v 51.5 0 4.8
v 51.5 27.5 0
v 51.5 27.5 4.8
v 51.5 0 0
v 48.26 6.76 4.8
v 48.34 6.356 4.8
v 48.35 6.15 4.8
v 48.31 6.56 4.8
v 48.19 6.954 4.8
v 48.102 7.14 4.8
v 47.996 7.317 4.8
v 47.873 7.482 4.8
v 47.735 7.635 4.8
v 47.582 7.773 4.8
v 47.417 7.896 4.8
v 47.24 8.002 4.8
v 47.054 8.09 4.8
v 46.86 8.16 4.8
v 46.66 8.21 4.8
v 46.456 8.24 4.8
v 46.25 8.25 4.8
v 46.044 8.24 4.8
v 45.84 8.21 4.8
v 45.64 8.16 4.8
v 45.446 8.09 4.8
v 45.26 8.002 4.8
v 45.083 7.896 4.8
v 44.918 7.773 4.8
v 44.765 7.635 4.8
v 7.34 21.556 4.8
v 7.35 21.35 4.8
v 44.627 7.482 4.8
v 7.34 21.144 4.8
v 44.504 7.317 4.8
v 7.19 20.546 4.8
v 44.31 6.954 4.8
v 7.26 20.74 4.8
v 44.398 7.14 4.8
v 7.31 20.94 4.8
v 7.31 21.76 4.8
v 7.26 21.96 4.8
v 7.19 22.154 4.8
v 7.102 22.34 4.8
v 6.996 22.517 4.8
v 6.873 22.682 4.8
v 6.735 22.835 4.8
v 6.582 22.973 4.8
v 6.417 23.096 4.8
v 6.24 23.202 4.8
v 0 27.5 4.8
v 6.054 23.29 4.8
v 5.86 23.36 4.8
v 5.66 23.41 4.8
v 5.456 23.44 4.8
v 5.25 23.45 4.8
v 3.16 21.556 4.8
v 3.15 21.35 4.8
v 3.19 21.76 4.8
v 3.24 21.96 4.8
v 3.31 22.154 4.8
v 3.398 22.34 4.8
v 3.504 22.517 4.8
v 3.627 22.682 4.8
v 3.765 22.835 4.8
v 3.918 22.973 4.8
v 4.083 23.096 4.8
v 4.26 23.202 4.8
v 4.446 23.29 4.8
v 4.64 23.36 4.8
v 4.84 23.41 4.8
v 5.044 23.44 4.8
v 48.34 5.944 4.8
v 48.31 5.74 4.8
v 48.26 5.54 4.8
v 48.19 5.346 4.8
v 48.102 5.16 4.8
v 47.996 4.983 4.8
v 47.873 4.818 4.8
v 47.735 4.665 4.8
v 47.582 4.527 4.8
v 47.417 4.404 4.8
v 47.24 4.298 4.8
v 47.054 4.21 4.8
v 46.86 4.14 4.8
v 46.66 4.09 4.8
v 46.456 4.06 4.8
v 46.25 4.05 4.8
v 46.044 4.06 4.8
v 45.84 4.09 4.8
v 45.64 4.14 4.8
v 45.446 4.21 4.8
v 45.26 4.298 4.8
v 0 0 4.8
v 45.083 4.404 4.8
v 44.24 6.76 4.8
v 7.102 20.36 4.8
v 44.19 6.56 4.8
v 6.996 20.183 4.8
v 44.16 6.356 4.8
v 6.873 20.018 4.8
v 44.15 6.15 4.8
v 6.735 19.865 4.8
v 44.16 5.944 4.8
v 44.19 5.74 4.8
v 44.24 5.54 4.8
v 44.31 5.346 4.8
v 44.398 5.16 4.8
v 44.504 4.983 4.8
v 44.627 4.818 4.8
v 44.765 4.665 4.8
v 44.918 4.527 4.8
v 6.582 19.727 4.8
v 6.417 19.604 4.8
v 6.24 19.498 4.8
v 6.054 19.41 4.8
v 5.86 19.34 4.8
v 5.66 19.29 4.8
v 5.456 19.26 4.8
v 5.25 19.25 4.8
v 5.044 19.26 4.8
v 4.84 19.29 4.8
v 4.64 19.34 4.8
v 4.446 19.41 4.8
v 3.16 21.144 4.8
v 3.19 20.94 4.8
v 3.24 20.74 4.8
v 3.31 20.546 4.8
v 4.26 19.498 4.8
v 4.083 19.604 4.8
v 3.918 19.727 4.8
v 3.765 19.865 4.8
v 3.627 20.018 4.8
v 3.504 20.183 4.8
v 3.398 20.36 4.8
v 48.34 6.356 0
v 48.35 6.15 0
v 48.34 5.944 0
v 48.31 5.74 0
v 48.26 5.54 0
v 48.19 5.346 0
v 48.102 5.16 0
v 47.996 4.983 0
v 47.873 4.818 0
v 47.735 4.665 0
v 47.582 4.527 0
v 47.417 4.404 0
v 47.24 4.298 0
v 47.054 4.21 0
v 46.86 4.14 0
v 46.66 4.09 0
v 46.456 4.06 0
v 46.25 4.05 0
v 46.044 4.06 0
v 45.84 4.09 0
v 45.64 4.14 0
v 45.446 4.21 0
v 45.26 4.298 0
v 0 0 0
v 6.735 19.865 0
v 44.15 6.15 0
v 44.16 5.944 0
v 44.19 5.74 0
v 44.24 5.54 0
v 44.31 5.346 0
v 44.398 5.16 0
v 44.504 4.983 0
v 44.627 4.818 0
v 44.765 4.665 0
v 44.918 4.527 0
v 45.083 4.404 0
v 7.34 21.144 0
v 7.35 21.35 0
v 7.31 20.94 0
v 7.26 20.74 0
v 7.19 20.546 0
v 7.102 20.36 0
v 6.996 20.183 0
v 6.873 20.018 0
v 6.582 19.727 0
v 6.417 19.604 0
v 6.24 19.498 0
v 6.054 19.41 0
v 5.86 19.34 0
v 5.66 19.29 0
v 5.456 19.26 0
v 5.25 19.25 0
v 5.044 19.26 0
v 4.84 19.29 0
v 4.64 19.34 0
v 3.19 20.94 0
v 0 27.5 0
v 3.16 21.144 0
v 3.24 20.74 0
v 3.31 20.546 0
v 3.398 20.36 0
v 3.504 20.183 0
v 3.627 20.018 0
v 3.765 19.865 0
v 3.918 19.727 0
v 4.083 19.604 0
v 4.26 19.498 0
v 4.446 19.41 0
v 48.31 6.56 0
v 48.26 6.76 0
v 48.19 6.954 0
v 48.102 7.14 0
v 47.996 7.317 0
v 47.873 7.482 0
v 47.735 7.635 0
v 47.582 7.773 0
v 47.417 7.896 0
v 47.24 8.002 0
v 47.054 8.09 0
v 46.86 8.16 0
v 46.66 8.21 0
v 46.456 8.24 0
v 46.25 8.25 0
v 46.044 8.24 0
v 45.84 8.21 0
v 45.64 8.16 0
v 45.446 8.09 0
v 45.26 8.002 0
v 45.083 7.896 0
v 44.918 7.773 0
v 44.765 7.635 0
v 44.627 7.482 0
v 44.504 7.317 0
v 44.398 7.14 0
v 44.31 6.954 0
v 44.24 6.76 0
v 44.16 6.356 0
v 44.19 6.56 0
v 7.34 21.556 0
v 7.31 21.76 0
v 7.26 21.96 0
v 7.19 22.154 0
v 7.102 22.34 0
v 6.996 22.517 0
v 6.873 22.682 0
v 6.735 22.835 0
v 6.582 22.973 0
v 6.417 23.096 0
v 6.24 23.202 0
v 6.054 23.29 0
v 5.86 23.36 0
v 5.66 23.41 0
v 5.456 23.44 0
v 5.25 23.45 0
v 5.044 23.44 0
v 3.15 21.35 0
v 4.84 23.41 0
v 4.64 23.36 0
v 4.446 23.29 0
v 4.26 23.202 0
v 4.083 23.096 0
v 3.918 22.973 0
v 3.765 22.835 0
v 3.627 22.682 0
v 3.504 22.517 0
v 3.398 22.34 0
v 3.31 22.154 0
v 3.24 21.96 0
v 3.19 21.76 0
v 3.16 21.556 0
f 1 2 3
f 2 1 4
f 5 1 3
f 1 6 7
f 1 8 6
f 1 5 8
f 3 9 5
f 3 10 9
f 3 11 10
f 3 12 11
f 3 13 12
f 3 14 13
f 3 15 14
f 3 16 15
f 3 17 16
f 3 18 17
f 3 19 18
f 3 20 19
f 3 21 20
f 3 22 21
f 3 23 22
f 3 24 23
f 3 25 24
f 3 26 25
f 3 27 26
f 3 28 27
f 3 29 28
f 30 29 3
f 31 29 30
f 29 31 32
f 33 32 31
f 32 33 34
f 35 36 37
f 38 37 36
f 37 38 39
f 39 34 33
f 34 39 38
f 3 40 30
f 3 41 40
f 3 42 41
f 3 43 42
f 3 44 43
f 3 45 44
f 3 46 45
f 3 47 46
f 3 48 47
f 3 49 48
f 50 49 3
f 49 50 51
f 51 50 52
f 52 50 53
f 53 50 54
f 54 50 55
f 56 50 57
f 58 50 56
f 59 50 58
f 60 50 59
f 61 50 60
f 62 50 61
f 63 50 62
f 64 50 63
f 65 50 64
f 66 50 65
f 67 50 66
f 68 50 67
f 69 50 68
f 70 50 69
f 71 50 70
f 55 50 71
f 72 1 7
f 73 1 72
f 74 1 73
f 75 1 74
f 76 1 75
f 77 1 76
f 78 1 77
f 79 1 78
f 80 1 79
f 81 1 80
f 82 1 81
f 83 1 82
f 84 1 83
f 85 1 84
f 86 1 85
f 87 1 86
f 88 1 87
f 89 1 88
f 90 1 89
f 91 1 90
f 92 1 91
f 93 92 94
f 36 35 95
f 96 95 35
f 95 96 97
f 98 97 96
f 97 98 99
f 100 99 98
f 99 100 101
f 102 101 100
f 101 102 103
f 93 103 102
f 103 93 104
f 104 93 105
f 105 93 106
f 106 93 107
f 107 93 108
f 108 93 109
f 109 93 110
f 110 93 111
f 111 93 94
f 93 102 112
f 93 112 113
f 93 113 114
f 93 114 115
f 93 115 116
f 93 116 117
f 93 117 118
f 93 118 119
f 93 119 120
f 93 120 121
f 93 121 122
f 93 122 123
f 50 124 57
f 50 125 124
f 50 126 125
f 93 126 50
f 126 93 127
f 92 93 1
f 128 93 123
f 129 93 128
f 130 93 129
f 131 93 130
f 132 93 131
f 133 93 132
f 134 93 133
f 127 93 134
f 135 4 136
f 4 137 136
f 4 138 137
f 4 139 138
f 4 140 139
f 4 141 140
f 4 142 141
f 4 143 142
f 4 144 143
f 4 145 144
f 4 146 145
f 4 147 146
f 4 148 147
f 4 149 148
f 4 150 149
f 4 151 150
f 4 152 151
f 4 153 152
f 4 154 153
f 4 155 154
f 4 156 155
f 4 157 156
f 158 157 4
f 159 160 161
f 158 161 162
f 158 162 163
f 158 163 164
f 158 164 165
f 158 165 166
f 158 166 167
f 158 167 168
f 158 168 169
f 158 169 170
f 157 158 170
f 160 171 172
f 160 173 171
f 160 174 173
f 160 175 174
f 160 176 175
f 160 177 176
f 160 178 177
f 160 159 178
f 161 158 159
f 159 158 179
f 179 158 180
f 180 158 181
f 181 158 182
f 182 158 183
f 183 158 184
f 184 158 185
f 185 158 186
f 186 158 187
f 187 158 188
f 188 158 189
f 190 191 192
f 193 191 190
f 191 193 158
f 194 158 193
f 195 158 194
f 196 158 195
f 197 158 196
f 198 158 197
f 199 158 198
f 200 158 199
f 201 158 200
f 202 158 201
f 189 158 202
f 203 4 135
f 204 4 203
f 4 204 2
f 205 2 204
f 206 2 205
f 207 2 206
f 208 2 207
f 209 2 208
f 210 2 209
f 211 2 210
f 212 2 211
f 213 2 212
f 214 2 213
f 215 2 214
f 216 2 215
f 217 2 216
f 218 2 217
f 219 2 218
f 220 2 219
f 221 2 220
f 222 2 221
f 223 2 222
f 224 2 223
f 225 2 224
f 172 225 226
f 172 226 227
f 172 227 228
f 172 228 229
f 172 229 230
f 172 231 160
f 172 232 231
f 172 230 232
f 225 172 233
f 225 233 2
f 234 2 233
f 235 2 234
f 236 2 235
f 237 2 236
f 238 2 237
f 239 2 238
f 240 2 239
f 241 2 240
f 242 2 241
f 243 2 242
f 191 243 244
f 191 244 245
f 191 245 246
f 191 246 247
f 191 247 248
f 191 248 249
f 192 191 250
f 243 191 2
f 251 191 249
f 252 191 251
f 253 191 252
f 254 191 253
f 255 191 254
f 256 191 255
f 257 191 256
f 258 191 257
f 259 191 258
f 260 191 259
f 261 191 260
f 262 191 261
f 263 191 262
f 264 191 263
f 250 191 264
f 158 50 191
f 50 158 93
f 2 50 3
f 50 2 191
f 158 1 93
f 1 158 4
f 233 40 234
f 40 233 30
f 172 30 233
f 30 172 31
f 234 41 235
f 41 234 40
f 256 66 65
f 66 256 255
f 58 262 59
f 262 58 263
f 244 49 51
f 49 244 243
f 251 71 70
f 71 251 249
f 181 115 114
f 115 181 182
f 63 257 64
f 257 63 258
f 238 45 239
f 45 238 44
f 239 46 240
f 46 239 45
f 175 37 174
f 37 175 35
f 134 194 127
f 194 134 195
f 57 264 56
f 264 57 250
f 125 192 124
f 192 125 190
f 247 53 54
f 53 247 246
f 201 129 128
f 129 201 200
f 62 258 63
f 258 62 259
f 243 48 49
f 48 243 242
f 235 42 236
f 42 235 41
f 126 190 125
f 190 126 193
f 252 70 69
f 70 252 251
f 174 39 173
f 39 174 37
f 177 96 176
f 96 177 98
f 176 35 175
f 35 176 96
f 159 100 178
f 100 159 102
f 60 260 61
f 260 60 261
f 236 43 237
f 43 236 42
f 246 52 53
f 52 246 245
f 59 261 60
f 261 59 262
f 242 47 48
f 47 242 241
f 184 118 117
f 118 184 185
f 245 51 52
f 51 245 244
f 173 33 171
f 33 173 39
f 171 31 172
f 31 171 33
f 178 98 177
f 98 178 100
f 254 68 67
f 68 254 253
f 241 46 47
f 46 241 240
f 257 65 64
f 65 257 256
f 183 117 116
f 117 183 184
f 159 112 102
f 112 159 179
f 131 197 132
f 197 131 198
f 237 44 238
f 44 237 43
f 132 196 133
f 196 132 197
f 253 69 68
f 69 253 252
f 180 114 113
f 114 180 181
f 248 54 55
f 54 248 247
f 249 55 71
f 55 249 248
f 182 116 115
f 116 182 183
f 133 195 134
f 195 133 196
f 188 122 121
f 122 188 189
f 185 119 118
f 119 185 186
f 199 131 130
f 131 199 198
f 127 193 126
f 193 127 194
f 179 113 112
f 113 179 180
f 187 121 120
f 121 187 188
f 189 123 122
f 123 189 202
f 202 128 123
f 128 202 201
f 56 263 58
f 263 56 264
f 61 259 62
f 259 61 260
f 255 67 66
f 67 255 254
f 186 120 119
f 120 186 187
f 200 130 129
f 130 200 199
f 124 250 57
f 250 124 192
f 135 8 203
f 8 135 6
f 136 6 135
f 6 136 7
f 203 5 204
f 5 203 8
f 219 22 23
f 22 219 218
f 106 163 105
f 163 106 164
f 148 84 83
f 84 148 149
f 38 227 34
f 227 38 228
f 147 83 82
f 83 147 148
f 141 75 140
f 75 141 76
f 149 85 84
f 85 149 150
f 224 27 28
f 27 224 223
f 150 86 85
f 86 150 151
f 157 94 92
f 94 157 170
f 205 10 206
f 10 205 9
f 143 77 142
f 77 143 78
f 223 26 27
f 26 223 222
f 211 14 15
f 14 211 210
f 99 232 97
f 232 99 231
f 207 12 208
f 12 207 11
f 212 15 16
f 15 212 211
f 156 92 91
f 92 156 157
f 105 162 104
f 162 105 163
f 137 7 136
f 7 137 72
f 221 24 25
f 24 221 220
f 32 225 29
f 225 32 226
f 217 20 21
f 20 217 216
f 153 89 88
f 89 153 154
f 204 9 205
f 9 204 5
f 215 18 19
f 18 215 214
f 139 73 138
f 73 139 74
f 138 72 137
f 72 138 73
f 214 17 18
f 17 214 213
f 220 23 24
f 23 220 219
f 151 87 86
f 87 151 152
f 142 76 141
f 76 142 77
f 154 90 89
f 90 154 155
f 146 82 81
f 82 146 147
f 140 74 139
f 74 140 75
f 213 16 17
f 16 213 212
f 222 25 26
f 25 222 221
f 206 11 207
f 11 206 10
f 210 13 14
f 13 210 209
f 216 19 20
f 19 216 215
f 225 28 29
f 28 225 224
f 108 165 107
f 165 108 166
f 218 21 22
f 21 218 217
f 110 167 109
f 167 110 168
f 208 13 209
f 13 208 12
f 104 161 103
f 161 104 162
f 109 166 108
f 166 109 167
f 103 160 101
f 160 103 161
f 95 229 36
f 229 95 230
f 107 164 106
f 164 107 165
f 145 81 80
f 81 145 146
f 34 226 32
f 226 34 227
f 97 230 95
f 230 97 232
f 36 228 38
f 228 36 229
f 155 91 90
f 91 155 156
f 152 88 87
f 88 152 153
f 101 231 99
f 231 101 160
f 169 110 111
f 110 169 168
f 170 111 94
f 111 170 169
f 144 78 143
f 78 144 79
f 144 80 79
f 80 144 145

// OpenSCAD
block_x = 51.5;
block_y = 27.5;

hole_spacing_x = 41;
hole_spacing_y = 15.2;
hole_dia = 4.2;

spacer_z = 4.8;

f = 0.01;
df = 2 * f;
$fn = 64;

// derived_values
hole_offset_x = (block_x - hole_spacing_x) / 2;
hole_offset_y = (block_y - hole_spacing_y) / 2;

difference() {
    cube([block_x, block_y, spacer_z]);
    translate([hole_offset_x, block_y - hole_offset_y, -f])
        cylinder(d = hole_dia, h = spacer_z + df);
    translate([block_x - hole_offset_x, hole_offset_y, -f])
        cylinder(d = hole_dia, h = spacer_z + df);
}
